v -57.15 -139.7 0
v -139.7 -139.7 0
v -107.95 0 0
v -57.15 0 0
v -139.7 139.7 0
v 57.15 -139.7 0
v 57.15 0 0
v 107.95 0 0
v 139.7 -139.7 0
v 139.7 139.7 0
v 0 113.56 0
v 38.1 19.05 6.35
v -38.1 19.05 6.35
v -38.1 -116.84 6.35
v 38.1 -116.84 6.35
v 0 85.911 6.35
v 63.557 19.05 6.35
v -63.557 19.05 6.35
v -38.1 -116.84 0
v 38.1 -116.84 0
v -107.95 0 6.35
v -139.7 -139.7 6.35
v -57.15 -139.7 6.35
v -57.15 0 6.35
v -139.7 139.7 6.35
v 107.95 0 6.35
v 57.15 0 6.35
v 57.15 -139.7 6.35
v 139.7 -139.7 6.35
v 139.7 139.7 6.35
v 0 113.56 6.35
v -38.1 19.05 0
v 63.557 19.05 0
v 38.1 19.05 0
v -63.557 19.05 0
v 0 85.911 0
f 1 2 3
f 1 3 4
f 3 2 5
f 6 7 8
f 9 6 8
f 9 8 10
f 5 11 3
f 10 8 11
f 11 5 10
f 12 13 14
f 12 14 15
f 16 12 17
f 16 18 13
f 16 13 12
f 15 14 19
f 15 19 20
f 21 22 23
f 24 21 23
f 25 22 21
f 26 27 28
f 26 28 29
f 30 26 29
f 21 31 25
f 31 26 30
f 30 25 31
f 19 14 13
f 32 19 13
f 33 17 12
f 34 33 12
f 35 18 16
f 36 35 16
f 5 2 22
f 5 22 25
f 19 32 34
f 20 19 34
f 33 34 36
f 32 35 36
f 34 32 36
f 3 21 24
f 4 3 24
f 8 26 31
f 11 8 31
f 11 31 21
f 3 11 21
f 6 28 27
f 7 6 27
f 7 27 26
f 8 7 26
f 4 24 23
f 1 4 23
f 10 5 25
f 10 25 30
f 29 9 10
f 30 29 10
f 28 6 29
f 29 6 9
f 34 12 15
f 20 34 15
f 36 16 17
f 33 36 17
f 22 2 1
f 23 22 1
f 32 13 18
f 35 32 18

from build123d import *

# Parameters (mm, degrees)
F0_W     = 279.4
F0_H     = 279.4
F1_DEPTH = 6.35
F2_W     = 76.2
F2_H     = 12.7
F2_H_2   = 10.16
F3_DEPTH = 6.35


# Not quite as in the source:
# - a feature names something its author has since deleted; it is built from what else it names


with BuildPart() as f1:
    # F0 (on Top) → F1 (new body)
    with BuildSketch(Plane.XY):
        Rectangle(F0_W, F0_H)
    extrude(amount=F1_DEPTH)

    # F2 (on face) → F3 (cut)
    with BuildSketch(Plane.XY.offset(6.35)):
        Polygon((57.15, 0), (107.95, 0), (0, 113.5604063203), (-107.95, 0), (-57.15, 0), (-57.15, -139.7), (-38.1, -139.7), (-38.1, -127), (-38.1, -116.84), (-38.1, 0), (-38.1, 19.05), (-63.5574616586, 19.05), (0, 85.9106870833), (63.5574616586, 19.05), (38.1, 19.05), (38.1, 0), (38.1, -116.84), (38.1, -127), (38.1, -139.7), (57.15, -139.7), align=None)
        with Locations((0, -133.35)):
            Rectangle(F2_W, F2_H)
        with Locations((0, -121.92)):
            Rectangle(F2_W, F2_H_2)
    extrude(amount=-F3_DEPTH, mode=Mode.SUBTRACT)


solid = f1.part
